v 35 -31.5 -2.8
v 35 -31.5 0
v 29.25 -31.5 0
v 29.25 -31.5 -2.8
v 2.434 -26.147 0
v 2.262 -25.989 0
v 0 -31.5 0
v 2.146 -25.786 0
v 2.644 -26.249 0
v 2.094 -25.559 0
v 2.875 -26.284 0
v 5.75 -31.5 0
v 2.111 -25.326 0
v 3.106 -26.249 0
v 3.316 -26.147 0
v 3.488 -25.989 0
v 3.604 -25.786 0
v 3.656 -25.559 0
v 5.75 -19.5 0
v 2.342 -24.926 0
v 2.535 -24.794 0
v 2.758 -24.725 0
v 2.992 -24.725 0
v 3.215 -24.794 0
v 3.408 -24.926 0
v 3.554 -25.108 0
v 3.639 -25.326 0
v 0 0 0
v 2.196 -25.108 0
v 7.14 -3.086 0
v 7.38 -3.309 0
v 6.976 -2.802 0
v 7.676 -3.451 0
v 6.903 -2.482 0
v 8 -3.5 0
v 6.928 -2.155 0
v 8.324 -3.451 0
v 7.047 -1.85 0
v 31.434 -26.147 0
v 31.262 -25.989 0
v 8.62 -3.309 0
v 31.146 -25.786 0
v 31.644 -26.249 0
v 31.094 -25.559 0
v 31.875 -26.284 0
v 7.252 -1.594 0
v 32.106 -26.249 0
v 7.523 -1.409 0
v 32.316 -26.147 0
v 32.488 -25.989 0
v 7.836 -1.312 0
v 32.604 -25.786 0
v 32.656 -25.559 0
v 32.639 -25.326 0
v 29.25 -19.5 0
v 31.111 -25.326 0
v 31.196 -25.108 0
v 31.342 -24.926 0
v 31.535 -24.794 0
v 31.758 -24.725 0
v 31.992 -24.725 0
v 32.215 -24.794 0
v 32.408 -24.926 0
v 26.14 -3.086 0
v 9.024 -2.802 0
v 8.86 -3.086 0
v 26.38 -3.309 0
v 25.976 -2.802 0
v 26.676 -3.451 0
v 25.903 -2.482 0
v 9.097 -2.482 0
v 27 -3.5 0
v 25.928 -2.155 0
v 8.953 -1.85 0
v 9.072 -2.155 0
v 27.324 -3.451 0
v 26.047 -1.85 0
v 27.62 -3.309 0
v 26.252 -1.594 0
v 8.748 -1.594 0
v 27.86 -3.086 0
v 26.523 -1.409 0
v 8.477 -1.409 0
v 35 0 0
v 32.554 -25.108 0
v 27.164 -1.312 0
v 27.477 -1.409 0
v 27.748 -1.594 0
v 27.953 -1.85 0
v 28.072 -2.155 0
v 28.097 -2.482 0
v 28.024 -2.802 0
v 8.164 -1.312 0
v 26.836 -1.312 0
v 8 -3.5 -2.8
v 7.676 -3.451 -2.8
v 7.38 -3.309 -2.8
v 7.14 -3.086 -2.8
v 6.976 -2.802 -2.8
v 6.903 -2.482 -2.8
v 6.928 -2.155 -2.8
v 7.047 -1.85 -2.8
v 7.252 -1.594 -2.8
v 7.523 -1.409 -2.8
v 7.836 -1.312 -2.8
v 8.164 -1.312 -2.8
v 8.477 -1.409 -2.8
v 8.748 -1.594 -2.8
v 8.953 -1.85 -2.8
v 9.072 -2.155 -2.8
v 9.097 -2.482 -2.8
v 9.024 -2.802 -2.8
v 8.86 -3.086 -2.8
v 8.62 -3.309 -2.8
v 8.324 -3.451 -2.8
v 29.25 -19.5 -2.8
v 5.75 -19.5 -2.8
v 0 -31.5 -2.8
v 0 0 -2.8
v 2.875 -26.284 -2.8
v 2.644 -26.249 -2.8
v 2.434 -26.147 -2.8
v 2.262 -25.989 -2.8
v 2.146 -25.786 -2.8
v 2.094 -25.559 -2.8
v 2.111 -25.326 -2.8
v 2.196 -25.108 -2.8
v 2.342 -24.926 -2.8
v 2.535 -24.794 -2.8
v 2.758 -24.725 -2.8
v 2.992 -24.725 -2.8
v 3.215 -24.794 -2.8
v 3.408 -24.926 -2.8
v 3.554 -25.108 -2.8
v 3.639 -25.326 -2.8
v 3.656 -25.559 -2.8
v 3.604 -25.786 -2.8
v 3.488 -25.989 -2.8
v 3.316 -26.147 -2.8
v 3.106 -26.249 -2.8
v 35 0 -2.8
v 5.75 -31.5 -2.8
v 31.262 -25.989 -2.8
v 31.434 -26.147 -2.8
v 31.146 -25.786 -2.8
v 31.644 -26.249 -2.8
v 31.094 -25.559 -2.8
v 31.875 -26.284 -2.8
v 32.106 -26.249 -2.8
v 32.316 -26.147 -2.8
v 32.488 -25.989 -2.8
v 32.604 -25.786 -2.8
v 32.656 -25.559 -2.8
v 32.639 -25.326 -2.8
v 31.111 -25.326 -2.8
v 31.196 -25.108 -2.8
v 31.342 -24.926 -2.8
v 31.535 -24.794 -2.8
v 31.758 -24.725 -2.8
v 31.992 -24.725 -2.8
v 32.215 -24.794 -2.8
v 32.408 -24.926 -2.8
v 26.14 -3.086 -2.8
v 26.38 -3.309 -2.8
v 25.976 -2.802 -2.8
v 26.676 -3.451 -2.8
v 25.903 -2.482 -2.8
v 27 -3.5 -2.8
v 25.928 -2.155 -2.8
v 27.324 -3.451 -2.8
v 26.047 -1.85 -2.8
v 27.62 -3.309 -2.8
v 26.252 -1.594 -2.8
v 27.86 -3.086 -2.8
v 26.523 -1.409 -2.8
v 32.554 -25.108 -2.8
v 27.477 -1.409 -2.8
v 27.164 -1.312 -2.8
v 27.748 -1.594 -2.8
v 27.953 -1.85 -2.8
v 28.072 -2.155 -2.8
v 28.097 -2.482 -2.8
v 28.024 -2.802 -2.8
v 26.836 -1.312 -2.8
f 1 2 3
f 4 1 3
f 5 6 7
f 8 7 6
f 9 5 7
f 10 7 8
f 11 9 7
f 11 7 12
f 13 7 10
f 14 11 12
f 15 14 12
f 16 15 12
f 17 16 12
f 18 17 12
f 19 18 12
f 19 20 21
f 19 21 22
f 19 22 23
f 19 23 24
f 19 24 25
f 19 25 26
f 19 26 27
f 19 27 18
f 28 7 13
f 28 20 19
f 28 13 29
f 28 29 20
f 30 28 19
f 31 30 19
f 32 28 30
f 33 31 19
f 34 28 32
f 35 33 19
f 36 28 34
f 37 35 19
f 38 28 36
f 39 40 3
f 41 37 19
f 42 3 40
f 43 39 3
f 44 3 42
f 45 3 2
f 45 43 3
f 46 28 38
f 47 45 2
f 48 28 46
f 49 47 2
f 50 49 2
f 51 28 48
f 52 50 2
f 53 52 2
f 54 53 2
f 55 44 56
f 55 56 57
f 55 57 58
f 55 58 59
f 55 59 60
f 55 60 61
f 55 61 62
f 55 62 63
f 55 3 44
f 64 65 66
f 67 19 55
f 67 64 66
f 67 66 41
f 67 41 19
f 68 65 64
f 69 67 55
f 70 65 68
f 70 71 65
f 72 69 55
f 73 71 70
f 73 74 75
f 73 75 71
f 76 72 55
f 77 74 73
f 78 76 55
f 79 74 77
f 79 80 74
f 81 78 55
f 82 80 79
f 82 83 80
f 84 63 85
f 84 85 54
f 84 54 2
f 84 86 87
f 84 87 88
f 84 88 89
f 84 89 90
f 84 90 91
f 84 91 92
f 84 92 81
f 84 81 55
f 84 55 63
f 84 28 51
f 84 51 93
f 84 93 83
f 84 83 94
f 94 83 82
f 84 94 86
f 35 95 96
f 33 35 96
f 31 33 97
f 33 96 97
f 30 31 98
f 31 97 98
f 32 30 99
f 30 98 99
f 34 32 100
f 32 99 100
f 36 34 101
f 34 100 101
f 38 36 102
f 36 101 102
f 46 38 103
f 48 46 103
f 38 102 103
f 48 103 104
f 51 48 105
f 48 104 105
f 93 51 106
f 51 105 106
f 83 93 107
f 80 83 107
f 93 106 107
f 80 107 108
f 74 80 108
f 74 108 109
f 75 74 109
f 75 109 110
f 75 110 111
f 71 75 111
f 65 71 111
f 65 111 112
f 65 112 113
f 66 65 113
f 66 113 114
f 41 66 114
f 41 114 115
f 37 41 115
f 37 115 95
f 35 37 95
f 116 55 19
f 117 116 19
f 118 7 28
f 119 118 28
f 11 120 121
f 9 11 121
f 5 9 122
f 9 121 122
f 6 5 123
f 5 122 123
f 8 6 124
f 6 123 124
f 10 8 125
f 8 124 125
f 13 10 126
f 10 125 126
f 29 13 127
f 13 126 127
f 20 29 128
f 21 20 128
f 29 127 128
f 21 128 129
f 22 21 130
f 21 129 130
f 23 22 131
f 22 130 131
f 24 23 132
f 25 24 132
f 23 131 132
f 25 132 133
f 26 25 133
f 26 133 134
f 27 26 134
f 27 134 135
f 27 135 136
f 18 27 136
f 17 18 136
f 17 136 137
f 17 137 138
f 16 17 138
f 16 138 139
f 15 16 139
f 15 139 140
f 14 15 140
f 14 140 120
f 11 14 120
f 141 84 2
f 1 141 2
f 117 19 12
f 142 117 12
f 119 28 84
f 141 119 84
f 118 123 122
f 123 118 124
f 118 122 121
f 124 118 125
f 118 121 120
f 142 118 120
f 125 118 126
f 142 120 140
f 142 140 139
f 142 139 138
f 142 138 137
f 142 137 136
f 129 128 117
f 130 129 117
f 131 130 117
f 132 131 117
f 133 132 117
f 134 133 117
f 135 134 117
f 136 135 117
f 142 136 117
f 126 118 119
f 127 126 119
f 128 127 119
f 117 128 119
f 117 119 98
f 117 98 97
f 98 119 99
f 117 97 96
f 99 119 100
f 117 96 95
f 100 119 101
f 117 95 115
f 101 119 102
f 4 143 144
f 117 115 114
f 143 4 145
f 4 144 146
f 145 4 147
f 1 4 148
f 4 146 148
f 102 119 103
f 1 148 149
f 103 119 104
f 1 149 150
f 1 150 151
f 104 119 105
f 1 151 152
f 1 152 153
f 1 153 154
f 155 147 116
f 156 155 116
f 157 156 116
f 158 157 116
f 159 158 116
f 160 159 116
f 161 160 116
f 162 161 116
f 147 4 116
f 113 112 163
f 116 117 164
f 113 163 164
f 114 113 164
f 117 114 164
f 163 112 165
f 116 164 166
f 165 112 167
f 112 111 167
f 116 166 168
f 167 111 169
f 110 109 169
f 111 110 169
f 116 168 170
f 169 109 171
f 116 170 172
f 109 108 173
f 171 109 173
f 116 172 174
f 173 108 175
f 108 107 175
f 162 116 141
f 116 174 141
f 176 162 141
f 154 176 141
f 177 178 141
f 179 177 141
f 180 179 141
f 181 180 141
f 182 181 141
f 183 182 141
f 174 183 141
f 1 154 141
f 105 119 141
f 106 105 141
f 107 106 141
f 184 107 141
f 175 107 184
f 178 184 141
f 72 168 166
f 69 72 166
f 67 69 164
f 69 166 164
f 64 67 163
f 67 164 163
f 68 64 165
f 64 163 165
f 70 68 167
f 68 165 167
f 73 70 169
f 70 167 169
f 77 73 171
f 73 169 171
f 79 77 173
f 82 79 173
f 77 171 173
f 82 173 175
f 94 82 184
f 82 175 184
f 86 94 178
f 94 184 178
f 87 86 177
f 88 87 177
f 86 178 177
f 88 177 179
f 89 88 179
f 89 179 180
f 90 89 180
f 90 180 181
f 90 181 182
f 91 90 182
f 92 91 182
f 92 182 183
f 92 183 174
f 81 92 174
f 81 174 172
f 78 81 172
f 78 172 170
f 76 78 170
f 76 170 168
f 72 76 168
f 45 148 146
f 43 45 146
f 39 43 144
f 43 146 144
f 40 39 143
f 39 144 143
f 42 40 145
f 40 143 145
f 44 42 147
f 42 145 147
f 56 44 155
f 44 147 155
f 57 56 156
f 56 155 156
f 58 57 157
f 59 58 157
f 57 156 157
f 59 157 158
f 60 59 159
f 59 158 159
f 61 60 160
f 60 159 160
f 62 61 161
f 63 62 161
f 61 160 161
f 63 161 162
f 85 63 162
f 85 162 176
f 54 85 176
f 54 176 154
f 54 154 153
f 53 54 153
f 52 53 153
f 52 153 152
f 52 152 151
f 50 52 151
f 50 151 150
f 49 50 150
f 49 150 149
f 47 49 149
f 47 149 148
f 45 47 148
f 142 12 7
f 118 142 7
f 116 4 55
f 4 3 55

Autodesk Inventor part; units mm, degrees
ref_plane "YZ Plane" through (0, 0, 0) normal (1, 0, 0) x (0, 1, 0)
ref_plane "XZ Plane" through (0, 0, 0) normal (0, 1, 0) x (-1, 0, 0)
ref_plane "XY Plane" through (0, 0, 0) normal (0, 0, 1) x (1, 0, 0)
sketch "Sketch1" plane through (0, 0, 0) normal (0, 0, 1) x (1, 0, 0)
  line L0 (0, 0) -> (35, 0)
  line L1 (35, 0) -> (35, -31.5)
  line L2 (35, -31.5) -> (0, -31.5)
  line L3 (0, -31.5) -> (0, 0)
  dimension "d0" = 31.5
  dimension "d1" = 35
extrude "Extrusion1" add sketch "Sketch1" against normal blind 2.8
sketch "Sketch2" plane through (0, 0, 0) normal (0, 0, 1) x (1, 0, 0)
  line L0 (35, -31.5) -> (0, -31.5) projected
  line L1 (5.75, -37.2591) -> (29.25, -37.2591)
  line L2 (29.25, -37.2591) -> (29.25, -19.5)
  line L3 (29.25, -19.5) -> (5.75, -19.5)
  line L4 (5.75, -19.5) -> (5.75, -37.2591)
  point P0 (17.5, -19.5)
  point P1 (17.5, -31.5)
  dimension "d4" = 12
  dimension "d5" = 23.5
extrude "Extrusion2" cut sketch "Sketch2" against normal through all
sketch "Sketch3" plane through (0, 0, 0) normal (0, 0, 1) x (1, 0, 0)
  line L0 (0, 0) -> (35, 0) projected
  line L1 (0, -31.5) -> (0, 0) projected
  point P0 (8, -2.4)
  point P1 (27, -2.4)
  dimension "d8" = 8
  dimension "d9" = 19
  dimension "d10" = 2.4
hole "Hole1" at (8, -2.4, 0) at (27, -2.4, 0) direction (0, 0, -1) diameter 2.2 end through all
sketch "Sketch4" plane through (0, 0, 0) normal (0, 0, 1) x (1, 0, 0)
  line L0 (29.25, -19.5) -> (29.25, -31.5) projected
  line L1 (5.75, -31.5) -> (0, -31.5) projected
  line L2 (5.75, -31.5) -> (5.75, -19.5) projected
  point P0 (2.875, -25.5)
  point P1 (31.875, -25.5)
  point P2 (5.75, -25.5)
  point P3 (29.25, -25.5)
  point P4 (2.875, -31.5)
hole "Hole2" at (2.875, -25.5, 0) at (31.875, -25.5, 0) direction (0, 0, -1) diameter 1.567 end through all thread size "M2x0.4" class "6H" standard "ISO Metric profile"
properties part number "Servo Mount1"
